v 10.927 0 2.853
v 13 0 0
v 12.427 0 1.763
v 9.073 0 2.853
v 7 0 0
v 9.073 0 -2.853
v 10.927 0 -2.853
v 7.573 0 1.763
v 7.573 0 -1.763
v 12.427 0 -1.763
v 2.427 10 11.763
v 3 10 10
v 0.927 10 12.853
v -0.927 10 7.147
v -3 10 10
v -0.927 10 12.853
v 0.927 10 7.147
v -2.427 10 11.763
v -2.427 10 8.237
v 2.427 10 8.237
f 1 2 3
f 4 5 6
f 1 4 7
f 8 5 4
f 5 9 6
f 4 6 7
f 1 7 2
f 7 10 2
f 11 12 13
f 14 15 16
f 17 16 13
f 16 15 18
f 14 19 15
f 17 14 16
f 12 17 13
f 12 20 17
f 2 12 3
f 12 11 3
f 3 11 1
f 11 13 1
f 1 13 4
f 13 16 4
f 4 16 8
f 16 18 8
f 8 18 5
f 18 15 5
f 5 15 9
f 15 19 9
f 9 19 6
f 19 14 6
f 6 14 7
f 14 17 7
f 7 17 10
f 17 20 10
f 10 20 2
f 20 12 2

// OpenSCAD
// Tilt up child 2D section and extrude along Y,
//   moving from S to E
module line_extrudeY(S,E)
{
    D=E-S;
    
    // section(XY)  extrusion  translation
    m=[
        [1,0,D.x,S.x],
        [0,0,D.y,S.y],
        [0,1,D.z,S.z]
    ];
    multmatrix(m) {
        linear_extrude(height=1.00001)
            children();
        
    }
}

// Extrude 2D shape along a list of points.
//   2D shape is tilted up so it moves along +Y
module list_extrudeY(list) {
    for (i=[1:len(list)-1]) {
        line_extrudeY(list[i-1],list[i])
            children();
    }
}

list_extrudeY([[10,0,0],[0,10,10]]) circle(r=3.0);
